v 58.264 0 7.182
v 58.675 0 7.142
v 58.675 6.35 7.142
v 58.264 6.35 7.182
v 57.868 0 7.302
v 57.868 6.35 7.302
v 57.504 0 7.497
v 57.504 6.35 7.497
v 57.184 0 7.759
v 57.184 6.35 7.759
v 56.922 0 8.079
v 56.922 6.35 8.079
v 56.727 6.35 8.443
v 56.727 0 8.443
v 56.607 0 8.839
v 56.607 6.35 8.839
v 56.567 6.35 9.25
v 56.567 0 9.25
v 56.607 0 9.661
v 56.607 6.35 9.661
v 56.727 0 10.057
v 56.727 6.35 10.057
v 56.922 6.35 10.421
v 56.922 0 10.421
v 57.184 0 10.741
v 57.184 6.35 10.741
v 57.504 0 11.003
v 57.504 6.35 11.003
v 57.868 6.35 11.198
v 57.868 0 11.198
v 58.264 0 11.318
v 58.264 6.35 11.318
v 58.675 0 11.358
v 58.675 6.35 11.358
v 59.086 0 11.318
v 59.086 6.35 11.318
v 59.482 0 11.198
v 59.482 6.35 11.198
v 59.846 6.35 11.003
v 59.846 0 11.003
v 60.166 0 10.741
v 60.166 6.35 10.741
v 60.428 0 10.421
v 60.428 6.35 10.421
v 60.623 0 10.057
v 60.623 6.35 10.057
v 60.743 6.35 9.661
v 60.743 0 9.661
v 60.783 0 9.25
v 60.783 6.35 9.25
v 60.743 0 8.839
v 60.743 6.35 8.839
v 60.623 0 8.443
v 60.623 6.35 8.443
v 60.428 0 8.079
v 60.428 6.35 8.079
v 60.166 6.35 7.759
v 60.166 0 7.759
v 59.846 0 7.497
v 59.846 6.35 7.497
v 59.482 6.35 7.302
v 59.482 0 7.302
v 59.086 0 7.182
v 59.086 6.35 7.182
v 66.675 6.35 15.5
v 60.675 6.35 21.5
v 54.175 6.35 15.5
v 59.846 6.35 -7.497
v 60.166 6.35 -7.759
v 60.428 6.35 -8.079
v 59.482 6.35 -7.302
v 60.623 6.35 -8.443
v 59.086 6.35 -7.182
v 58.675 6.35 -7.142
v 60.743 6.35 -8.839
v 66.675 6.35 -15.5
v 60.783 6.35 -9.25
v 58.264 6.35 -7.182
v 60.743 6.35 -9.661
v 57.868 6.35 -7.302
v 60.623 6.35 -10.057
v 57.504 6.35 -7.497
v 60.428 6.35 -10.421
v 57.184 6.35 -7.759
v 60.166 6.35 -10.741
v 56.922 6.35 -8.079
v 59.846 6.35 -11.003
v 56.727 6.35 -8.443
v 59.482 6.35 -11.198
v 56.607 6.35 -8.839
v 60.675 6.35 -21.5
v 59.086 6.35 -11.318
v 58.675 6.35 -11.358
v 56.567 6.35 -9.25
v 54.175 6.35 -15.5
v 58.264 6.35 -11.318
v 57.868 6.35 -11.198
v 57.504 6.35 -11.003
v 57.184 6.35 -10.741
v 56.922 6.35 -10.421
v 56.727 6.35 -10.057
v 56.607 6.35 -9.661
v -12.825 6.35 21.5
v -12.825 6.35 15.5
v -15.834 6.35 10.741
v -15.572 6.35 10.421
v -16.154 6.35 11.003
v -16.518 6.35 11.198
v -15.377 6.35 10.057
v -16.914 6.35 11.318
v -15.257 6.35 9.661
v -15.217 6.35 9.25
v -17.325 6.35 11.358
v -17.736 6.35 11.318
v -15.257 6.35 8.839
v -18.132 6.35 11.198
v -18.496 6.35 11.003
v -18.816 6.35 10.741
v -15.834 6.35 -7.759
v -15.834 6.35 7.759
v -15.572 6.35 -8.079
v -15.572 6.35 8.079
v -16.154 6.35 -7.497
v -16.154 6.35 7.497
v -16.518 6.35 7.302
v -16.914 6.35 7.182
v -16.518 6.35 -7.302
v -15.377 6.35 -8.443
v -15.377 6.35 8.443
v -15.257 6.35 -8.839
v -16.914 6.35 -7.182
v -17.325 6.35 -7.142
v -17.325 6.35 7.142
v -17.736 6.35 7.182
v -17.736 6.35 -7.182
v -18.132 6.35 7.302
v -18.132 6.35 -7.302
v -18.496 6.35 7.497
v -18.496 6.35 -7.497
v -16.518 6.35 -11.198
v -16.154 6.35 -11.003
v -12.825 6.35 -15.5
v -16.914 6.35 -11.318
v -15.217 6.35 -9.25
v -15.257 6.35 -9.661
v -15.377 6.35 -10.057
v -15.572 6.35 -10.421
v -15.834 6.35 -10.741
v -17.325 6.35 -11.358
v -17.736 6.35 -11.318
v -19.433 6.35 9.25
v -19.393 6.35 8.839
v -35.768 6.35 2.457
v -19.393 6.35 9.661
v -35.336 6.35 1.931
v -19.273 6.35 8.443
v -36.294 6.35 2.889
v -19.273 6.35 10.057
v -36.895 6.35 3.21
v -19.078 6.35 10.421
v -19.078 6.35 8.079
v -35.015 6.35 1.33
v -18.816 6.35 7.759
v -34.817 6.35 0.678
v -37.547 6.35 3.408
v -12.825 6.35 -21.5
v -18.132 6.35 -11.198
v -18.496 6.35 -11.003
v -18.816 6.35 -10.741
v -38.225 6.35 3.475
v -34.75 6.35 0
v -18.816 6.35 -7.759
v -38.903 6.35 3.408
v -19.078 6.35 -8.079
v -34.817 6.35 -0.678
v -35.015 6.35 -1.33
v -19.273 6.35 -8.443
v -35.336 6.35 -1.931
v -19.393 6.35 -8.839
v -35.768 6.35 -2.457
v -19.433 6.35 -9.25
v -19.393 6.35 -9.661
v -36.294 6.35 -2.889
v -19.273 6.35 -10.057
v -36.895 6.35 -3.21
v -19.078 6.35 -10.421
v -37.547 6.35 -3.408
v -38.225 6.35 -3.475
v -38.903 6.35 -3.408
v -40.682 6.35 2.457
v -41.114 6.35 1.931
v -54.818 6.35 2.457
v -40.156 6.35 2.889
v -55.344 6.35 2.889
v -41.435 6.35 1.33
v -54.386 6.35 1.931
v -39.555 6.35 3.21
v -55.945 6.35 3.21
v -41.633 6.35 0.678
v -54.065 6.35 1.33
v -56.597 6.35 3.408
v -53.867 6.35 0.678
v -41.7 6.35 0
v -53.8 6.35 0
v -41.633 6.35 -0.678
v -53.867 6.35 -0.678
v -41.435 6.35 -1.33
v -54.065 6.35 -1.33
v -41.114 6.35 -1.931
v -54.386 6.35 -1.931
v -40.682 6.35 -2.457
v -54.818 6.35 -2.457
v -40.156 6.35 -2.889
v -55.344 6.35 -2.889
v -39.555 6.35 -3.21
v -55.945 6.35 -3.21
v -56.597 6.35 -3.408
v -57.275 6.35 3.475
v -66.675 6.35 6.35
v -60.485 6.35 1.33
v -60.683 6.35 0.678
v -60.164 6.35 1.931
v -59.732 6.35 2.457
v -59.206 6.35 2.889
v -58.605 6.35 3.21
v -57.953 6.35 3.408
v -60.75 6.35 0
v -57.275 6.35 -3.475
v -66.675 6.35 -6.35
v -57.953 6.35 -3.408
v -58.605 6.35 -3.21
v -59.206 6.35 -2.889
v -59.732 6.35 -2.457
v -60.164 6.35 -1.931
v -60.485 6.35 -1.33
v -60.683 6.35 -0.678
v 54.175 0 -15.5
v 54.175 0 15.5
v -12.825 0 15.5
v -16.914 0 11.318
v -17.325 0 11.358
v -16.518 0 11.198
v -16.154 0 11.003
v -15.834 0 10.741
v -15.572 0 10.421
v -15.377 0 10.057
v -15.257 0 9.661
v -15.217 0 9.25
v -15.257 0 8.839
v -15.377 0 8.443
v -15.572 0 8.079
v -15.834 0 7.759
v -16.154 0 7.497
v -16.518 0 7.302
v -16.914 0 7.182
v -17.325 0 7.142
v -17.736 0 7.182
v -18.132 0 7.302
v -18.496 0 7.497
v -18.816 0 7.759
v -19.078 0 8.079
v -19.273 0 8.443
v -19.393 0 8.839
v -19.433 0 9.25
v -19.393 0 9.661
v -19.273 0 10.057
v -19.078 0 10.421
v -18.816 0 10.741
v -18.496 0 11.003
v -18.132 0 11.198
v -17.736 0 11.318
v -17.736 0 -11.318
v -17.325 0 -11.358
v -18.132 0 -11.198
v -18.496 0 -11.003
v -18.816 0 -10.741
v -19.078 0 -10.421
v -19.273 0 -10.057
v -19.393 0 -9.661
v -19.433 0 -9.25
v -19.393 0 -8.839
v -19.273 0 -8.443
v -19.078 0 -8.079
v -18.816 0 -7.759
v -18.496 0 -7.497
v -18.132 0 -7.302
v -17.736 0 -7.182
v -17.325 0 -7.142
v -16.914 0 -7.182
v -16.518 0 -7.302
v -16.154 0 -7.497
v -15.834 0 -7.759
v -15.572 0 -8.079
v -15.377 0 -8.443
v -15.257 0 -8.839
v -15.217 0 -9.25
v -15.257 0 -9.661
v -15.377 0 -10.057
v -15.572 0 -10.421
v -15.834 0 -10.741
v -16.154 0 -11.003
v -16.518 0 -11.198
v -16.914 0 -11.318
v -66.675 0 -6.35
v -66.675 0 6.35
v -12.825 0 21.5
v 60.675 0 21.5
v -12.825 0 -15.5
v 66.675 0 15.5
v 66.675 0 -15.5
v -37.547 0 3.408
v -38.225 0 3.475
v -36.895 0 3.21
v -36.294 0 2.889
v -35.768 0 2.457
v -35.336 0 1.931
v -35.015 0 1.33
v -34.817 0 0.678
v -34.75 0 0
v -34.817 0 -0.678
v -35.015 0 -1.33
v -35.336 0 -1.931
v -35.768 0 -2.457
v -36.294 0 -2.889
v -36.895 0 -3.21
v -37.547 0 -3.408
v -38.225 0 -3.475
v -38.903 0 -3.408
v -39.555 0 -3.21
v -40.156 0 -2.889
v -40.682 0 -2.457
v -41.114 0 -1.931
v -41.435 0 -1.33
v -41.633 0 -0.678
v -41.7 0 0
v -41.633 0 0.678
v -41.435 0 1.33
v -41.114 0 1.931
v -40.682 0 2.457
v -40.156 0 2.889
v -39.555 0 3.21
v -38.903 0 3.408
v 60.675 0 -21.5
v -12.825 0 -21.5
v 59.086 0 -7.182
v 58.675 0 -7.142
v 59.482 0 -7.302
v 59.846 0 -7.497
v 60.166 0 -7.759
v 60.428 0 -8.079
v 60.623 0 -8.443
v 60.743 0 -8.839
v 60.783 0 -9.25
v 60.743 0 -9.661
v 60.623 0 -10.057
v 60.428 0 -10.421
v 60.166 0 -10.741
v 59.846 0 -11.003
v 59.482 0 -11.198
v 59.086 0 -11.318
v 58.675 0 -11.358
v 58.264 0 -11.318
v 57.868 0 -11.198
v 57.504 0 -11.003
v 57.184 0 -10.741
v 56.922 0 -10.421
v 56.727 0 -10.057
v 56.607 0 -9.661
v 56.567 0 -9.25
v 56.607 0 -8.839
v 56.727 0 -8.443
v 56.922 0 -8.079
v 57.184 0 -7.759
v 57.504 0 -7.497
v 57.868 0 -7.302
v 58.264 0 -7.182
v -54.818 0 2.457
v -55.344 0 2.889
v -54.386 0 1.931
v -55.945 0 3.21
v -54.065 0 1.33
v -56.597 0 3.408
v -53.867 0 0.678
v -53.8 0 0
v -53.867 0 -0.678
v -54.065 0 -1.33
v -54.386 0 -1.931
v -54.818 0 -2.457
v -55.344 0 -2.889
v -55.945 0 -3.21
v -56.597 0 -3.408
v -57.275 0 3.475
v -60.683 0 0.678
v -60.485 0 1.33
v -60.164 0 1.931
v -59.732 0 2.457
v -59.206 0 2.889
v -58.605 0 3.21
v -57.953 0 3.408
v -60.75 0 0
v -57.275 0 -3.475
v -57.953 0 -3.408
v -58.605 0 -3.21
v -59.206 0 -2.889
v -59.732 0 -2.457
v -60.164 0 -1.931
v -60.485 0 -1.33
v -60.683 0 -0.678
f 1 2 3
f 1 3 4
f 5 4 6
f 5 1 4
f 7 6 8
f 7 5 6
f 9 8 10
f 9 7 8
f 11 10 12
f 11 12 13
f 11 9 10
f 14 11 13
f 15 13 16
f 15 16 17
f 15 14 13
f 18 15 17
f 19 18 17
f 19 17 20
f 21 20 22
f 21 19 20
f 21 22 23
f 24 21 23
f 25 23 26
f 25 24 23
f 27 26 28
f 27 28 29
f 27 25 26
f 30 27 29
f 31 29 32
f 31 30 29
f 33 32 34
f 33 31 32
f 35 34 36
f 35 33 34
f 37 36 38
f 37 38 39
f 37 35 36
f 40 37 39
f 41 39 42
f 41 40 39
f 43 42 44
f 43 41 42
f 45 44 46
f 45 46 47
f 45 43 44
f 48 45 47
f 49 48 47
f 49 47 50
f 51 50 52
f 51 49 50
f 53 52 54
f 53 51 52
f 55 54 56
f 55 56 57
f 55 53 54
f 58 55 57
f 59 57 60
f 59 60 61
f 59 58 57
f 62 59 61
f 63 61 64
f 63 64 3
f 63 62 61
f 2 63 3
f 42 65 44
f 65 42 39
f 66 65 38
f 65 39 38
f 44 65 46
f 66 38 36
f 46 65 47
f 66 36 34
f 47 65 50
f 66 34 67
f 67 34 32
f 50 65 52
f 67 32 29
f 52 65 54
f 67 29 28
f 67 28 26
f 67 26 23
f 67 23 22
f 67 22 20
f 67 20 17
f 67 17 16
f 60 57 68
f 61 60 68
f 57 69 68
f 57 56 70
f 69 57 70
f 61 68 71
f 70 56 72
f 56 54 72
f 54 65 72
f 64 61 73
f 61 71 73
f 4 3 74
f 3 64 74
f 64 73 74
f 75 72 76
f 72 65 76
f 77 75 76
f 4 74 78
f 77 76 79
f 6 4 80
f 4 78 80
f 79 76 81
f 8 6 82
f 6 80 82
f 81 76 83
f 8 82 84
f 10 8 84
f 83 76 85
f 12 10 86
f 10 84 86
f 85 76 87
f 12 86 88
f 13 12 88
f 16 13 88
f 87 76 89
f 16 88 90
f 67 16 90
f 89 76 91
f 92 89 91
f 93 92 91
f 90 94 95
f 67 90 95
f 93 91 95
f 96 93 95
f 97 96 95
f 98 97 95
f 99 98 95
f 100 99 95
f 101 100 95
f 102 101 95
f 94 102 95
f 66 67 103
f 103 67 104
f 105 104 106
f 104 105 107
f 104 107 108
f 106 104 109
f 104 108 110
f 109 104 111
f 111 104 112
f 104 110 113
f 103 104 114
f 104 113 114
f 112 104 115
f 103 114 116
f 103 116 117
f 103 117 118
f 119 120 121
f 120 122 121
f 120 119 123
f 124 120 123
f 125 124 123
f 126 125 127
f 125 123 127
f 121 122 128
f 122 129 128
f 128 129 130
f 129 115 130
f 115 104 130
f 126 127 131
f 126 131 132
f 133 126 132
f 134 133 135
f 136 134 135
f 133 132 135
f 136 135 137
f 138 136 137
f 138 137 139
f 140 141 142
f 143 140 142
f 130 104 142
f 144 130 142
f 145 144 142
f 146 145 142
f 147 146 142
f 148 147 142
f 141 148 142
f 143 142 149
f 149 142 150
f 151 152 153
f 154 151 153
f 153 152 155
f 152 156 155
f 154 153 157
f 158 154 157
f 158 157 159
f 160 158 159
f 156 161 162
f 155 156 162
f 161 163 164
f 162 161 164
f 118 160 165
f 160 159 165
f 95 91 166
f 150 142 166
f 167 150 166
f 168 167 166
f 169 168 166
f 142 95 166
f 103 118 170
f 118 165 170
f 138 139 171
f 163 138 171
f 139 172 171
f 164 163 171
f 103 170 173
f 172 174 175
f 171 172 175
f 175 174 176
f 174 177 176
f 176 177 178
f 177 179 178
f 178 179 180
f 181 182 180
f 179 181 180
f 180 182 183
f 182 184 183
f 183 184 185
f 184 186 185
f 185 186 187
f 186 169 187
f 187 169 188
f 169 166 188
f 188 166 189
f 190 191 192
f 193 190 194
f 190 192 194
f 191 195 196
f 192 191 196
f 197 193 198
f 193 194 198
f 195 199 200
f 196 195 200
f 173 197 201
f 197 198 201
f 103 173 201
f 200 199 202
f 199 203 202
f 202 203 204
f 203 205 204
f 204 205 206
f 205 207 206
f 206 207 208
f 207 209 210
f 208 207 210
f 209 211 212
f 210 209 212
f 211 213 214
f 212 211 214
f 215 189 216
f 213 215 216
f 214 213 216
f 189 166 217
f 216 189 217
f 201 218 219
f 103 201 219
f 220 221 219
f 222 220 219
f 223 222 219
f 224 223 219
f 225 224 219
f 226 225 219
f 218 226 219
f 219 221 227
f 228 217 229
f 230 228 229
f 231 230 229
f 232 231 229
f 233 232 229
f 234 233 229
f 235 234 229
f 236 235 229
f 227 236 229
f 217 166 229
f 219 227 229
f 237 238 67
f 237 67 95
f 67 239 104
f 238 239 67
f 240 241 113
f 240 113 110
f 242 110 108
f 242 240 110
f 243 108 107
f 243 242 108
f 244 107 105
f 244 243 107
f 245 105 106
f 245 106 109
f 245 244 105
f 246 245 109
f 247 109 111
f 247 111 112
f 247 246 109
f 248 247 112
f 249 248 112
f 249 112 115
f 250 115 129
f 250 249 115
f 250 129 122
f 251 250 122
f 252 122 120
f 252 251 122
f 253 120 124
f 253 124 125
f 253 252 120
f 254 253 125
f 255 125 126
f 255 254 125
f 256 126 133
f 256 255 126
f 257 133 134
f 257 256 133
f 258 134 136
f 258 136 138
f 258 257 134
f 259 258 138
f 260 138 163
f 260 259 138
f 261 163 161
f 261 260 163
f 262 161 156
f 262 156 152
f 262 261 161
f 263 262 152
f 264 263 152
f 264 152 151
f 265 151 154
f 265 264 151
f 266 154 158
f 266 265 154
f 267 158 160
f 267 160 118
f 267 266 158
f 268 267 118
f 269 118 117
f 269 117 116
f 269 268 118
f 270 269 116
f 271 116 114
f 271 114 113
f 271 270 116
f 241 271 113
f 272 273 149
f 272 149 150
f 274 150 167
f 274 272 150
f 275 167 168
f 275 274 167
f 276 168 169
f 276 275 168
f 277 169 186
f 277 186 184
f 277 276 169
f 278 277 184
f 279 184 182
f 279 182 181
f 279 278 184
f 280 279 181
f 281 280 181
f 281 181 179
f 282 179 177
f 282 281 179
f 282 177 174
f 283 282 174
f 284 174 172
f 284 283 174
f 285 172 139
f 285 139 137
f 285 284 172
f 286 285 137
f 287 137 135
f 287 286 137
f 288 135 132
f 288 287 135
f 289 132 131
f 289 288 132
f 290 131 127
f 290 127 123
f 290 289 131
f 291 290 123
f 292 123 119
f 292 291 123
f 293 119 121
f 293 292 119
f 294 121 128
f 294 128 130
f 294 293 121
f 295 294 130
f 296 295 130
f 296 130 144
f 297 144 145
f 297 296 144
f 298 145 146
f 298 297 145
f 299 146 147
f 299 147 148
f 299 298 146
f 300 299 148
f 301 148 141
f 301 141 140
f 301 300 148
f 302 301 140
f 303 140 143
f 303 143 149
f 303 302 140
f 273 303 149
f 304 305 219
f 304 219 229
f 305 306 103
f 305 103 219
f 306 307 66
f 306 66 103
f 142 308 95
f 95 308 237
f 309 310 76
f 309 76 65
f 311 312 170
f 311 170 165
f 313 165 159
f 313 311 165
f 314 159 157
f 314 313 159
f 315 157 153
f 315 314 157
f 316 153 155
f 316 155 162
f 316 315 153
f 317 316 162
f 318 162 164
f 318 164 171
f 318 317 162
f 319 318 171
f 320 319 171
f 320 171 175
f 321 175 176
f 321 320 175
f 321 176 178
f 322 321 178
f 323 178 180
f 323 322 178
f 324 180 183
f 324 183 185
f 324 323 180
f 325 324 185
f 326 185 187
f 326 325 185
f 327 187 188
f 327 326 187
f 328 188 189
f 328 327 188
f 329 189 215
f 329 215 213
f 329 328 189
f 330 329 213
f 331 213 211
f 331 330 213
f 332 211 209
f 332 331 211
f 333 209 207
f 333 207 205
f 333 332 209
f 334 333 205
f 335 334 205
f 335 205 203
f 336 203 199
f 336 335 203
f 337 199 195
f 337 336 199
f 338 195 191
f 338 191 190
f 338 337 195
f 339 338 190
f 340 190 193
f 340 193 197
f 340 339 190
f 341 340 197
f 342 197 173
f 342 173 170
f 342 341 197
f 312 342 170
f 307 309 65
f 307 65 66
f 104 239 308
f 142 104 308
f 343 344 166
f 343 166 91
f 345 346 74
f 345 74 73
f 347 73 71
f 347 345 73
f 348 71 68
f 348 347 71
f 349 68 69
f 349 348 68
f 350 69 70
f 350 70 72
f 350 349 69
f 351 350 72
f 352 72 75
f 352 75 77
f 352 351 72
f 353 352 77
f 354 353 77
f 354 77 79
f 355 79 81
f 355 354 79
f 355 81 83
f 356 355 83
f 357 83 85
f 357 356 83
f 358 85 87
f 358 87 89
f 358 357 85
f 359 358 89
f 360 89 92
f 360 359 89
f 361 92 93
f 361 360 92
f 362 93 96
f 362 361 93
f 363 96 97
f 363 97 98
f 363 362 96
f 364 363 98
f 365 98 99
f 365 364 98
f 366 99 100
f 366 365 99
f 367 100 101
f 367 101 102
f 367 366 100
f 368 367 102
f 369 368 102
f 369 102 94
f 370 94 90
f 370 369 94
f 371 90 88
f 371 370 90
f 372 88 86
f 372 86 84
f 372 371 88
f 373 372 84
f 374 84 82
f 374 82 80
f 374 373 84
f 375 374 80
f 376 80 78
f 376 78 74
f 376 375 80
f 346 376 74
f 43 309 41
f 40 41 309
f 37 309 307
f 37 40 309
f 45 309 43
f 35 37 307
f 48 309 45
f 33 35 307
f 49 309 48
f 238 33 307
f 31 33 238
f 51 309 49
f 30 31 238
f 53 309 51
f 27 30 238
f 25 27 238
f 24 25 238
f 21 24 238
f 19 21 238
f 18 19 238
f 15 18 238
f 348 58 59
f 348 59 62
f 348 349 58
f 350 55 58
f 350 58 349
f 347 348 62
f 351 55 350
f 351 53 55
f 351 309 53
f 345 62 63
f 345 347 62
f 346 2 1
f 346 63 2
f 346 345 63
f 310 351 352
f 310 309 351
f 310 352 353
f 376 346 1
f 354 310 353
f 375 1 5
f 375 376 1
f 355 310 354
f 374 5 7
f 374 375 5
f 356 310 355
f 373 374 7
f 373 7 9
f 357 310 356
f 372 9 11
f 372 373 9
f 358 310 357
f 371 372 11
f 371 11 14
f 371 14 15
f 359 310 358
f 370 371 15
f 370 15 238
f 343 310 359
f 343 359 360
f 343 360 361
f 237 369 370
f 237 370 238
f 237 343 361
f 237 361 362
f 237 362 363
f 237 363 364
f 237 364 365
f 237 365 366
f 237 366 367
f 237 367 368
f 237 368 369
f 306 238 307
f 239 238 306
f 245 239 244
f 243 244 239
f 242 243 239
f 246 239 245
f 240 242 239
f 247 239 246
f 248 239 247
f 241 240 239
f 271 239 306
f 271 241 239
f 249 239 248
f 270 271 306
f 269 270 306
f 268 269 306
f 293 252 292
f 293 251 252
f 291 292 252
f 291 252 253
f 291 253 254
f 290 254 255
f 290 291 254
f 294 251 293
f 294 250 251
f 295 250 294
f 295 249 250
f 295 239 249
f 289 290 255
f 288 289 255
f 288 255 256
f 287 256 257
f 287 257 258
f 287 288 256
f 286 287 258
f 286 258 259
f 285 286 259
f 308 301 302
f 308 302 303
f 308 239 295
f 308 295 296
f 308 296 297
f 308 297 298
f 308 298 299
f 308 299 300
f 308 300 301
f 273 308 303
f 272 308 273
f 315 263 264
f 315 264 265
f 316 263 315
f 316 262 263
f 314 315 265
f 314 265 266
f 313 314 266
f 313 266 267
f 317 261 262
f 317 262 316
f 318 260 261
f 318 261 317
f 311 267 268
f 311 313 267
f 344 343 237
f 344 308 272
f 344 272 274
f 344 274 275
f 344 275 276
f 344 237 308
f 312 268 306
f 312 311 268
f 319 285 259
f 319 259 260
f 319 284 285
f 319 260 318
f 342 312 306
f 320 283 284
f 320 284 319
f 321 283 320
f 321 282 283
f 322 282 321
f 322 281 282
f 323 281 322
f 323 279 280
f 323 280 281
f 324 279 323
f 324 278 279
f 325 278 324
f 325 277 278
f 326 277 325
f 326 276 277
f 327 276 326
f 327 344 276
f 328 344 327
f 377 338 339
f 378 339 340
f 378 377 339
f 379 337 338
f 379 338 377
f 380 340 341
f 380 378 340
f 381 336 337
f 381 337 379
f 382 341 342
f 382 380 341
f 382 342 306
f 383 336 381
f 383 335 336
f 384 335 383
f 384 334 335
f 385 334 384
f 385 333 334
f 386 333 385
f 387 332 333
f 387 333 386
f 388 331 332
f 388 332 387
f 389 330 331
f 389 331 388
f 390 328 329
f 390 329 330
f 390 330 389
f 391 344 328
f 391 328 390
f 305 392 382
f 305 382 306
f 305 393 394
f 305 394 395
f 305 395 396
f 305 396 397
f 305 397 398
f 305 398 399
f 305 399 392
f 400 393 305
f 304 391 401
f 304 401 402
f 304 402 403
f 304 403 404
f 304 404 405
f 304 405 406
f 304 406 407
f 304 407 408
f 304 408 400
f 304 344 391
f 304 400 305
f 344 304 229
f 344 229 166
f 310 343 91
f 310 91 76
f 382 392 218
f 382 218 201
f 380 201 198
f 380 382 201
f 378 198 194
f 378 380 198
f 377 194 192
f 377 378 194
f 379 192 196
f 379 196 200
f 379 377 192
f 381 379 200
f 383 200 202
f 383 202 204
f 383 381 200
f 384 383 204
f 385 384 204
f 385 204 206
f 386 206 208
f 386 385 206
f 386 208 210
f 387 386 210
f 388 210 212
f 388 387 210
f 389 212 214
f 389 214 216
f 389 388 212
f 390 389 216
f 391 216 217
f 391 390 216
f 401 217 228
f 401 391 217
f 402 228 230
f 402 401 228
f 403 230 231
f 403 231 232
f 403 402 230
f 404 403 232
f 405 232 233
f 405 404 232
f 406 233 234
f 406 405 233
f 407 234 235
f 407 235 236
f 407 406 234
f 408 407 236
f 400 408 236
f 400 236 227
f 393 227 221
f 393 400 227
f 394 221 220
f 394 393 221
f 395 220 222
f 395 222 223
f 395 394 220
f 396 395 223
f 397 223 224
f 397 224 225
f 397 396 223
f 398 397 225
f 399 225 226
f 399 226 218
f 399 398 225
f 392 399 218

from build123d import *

# Parameters (mm, degrees)
SKETCH1_R           = 2.1082
SKETCH1_R_2         = 3.475
SKETCH1_W           = 67
SKETCH1_H           = 31
BOSS_EXTRUDE1_DEPTH = 6.35


with BuildPart() as part:
    # Sketch1 → Boss-Extrude1 (new body)
    with BuildSketch(Plane(origin=(0, 0, 0), x_dir=(1, 0, 0), z_dir=(0, 1, 0))):
        Polygon((60.675, -21.5), (-12.825, -21.5), (-66.675, -6.35), (-66.675, 6.35), (-12.825, 21.5), (60.675, 21.5), (66.675, 15.5), (66.675, -15.5), align=None)
        with Locations(Location((58.675, 9.25, 0), (0, 0, 270))):
            Circle(SKETCH1_R, mode=Mode.SUBTRACT)
        with Locations(Location((58.675, -9.25, 0), (0, 0, 90))):
            Circle(SKETCH1_R, mode=Mode.SUBTRACT)
        with Locations(Location((-17.325, -9.25, 0), (0, 0, 270))):
            Circle(SKETCH1_R, mode=Mode.SUBTRACT)
        with Locations(Location((-17.325, 9.25, 0), (0, 0, 90))):
            Circle(SKETCH1_R, mode=Mode.SUBTRACT)
        with Locations(Location((-57.275, 0, 0), (0, 0, 270))):
            Circle(SKETCH1_R_2, mode=Mode.SUBTRACT)
        with Locations(Location((-38.225, 0, 0), (0, 0, 270))):
            Circle(SKETCH1_R_2, mode=Mode.SUBTRACT)
        with Locations((20.675, 0)):
            Rectangle(SKETCH1_W, SKETCH1_H, mode=Mode.SUBTRACT)
    extrude(amount=BOSS_EXTRUDE1_DEPTH)


solid = part.part
